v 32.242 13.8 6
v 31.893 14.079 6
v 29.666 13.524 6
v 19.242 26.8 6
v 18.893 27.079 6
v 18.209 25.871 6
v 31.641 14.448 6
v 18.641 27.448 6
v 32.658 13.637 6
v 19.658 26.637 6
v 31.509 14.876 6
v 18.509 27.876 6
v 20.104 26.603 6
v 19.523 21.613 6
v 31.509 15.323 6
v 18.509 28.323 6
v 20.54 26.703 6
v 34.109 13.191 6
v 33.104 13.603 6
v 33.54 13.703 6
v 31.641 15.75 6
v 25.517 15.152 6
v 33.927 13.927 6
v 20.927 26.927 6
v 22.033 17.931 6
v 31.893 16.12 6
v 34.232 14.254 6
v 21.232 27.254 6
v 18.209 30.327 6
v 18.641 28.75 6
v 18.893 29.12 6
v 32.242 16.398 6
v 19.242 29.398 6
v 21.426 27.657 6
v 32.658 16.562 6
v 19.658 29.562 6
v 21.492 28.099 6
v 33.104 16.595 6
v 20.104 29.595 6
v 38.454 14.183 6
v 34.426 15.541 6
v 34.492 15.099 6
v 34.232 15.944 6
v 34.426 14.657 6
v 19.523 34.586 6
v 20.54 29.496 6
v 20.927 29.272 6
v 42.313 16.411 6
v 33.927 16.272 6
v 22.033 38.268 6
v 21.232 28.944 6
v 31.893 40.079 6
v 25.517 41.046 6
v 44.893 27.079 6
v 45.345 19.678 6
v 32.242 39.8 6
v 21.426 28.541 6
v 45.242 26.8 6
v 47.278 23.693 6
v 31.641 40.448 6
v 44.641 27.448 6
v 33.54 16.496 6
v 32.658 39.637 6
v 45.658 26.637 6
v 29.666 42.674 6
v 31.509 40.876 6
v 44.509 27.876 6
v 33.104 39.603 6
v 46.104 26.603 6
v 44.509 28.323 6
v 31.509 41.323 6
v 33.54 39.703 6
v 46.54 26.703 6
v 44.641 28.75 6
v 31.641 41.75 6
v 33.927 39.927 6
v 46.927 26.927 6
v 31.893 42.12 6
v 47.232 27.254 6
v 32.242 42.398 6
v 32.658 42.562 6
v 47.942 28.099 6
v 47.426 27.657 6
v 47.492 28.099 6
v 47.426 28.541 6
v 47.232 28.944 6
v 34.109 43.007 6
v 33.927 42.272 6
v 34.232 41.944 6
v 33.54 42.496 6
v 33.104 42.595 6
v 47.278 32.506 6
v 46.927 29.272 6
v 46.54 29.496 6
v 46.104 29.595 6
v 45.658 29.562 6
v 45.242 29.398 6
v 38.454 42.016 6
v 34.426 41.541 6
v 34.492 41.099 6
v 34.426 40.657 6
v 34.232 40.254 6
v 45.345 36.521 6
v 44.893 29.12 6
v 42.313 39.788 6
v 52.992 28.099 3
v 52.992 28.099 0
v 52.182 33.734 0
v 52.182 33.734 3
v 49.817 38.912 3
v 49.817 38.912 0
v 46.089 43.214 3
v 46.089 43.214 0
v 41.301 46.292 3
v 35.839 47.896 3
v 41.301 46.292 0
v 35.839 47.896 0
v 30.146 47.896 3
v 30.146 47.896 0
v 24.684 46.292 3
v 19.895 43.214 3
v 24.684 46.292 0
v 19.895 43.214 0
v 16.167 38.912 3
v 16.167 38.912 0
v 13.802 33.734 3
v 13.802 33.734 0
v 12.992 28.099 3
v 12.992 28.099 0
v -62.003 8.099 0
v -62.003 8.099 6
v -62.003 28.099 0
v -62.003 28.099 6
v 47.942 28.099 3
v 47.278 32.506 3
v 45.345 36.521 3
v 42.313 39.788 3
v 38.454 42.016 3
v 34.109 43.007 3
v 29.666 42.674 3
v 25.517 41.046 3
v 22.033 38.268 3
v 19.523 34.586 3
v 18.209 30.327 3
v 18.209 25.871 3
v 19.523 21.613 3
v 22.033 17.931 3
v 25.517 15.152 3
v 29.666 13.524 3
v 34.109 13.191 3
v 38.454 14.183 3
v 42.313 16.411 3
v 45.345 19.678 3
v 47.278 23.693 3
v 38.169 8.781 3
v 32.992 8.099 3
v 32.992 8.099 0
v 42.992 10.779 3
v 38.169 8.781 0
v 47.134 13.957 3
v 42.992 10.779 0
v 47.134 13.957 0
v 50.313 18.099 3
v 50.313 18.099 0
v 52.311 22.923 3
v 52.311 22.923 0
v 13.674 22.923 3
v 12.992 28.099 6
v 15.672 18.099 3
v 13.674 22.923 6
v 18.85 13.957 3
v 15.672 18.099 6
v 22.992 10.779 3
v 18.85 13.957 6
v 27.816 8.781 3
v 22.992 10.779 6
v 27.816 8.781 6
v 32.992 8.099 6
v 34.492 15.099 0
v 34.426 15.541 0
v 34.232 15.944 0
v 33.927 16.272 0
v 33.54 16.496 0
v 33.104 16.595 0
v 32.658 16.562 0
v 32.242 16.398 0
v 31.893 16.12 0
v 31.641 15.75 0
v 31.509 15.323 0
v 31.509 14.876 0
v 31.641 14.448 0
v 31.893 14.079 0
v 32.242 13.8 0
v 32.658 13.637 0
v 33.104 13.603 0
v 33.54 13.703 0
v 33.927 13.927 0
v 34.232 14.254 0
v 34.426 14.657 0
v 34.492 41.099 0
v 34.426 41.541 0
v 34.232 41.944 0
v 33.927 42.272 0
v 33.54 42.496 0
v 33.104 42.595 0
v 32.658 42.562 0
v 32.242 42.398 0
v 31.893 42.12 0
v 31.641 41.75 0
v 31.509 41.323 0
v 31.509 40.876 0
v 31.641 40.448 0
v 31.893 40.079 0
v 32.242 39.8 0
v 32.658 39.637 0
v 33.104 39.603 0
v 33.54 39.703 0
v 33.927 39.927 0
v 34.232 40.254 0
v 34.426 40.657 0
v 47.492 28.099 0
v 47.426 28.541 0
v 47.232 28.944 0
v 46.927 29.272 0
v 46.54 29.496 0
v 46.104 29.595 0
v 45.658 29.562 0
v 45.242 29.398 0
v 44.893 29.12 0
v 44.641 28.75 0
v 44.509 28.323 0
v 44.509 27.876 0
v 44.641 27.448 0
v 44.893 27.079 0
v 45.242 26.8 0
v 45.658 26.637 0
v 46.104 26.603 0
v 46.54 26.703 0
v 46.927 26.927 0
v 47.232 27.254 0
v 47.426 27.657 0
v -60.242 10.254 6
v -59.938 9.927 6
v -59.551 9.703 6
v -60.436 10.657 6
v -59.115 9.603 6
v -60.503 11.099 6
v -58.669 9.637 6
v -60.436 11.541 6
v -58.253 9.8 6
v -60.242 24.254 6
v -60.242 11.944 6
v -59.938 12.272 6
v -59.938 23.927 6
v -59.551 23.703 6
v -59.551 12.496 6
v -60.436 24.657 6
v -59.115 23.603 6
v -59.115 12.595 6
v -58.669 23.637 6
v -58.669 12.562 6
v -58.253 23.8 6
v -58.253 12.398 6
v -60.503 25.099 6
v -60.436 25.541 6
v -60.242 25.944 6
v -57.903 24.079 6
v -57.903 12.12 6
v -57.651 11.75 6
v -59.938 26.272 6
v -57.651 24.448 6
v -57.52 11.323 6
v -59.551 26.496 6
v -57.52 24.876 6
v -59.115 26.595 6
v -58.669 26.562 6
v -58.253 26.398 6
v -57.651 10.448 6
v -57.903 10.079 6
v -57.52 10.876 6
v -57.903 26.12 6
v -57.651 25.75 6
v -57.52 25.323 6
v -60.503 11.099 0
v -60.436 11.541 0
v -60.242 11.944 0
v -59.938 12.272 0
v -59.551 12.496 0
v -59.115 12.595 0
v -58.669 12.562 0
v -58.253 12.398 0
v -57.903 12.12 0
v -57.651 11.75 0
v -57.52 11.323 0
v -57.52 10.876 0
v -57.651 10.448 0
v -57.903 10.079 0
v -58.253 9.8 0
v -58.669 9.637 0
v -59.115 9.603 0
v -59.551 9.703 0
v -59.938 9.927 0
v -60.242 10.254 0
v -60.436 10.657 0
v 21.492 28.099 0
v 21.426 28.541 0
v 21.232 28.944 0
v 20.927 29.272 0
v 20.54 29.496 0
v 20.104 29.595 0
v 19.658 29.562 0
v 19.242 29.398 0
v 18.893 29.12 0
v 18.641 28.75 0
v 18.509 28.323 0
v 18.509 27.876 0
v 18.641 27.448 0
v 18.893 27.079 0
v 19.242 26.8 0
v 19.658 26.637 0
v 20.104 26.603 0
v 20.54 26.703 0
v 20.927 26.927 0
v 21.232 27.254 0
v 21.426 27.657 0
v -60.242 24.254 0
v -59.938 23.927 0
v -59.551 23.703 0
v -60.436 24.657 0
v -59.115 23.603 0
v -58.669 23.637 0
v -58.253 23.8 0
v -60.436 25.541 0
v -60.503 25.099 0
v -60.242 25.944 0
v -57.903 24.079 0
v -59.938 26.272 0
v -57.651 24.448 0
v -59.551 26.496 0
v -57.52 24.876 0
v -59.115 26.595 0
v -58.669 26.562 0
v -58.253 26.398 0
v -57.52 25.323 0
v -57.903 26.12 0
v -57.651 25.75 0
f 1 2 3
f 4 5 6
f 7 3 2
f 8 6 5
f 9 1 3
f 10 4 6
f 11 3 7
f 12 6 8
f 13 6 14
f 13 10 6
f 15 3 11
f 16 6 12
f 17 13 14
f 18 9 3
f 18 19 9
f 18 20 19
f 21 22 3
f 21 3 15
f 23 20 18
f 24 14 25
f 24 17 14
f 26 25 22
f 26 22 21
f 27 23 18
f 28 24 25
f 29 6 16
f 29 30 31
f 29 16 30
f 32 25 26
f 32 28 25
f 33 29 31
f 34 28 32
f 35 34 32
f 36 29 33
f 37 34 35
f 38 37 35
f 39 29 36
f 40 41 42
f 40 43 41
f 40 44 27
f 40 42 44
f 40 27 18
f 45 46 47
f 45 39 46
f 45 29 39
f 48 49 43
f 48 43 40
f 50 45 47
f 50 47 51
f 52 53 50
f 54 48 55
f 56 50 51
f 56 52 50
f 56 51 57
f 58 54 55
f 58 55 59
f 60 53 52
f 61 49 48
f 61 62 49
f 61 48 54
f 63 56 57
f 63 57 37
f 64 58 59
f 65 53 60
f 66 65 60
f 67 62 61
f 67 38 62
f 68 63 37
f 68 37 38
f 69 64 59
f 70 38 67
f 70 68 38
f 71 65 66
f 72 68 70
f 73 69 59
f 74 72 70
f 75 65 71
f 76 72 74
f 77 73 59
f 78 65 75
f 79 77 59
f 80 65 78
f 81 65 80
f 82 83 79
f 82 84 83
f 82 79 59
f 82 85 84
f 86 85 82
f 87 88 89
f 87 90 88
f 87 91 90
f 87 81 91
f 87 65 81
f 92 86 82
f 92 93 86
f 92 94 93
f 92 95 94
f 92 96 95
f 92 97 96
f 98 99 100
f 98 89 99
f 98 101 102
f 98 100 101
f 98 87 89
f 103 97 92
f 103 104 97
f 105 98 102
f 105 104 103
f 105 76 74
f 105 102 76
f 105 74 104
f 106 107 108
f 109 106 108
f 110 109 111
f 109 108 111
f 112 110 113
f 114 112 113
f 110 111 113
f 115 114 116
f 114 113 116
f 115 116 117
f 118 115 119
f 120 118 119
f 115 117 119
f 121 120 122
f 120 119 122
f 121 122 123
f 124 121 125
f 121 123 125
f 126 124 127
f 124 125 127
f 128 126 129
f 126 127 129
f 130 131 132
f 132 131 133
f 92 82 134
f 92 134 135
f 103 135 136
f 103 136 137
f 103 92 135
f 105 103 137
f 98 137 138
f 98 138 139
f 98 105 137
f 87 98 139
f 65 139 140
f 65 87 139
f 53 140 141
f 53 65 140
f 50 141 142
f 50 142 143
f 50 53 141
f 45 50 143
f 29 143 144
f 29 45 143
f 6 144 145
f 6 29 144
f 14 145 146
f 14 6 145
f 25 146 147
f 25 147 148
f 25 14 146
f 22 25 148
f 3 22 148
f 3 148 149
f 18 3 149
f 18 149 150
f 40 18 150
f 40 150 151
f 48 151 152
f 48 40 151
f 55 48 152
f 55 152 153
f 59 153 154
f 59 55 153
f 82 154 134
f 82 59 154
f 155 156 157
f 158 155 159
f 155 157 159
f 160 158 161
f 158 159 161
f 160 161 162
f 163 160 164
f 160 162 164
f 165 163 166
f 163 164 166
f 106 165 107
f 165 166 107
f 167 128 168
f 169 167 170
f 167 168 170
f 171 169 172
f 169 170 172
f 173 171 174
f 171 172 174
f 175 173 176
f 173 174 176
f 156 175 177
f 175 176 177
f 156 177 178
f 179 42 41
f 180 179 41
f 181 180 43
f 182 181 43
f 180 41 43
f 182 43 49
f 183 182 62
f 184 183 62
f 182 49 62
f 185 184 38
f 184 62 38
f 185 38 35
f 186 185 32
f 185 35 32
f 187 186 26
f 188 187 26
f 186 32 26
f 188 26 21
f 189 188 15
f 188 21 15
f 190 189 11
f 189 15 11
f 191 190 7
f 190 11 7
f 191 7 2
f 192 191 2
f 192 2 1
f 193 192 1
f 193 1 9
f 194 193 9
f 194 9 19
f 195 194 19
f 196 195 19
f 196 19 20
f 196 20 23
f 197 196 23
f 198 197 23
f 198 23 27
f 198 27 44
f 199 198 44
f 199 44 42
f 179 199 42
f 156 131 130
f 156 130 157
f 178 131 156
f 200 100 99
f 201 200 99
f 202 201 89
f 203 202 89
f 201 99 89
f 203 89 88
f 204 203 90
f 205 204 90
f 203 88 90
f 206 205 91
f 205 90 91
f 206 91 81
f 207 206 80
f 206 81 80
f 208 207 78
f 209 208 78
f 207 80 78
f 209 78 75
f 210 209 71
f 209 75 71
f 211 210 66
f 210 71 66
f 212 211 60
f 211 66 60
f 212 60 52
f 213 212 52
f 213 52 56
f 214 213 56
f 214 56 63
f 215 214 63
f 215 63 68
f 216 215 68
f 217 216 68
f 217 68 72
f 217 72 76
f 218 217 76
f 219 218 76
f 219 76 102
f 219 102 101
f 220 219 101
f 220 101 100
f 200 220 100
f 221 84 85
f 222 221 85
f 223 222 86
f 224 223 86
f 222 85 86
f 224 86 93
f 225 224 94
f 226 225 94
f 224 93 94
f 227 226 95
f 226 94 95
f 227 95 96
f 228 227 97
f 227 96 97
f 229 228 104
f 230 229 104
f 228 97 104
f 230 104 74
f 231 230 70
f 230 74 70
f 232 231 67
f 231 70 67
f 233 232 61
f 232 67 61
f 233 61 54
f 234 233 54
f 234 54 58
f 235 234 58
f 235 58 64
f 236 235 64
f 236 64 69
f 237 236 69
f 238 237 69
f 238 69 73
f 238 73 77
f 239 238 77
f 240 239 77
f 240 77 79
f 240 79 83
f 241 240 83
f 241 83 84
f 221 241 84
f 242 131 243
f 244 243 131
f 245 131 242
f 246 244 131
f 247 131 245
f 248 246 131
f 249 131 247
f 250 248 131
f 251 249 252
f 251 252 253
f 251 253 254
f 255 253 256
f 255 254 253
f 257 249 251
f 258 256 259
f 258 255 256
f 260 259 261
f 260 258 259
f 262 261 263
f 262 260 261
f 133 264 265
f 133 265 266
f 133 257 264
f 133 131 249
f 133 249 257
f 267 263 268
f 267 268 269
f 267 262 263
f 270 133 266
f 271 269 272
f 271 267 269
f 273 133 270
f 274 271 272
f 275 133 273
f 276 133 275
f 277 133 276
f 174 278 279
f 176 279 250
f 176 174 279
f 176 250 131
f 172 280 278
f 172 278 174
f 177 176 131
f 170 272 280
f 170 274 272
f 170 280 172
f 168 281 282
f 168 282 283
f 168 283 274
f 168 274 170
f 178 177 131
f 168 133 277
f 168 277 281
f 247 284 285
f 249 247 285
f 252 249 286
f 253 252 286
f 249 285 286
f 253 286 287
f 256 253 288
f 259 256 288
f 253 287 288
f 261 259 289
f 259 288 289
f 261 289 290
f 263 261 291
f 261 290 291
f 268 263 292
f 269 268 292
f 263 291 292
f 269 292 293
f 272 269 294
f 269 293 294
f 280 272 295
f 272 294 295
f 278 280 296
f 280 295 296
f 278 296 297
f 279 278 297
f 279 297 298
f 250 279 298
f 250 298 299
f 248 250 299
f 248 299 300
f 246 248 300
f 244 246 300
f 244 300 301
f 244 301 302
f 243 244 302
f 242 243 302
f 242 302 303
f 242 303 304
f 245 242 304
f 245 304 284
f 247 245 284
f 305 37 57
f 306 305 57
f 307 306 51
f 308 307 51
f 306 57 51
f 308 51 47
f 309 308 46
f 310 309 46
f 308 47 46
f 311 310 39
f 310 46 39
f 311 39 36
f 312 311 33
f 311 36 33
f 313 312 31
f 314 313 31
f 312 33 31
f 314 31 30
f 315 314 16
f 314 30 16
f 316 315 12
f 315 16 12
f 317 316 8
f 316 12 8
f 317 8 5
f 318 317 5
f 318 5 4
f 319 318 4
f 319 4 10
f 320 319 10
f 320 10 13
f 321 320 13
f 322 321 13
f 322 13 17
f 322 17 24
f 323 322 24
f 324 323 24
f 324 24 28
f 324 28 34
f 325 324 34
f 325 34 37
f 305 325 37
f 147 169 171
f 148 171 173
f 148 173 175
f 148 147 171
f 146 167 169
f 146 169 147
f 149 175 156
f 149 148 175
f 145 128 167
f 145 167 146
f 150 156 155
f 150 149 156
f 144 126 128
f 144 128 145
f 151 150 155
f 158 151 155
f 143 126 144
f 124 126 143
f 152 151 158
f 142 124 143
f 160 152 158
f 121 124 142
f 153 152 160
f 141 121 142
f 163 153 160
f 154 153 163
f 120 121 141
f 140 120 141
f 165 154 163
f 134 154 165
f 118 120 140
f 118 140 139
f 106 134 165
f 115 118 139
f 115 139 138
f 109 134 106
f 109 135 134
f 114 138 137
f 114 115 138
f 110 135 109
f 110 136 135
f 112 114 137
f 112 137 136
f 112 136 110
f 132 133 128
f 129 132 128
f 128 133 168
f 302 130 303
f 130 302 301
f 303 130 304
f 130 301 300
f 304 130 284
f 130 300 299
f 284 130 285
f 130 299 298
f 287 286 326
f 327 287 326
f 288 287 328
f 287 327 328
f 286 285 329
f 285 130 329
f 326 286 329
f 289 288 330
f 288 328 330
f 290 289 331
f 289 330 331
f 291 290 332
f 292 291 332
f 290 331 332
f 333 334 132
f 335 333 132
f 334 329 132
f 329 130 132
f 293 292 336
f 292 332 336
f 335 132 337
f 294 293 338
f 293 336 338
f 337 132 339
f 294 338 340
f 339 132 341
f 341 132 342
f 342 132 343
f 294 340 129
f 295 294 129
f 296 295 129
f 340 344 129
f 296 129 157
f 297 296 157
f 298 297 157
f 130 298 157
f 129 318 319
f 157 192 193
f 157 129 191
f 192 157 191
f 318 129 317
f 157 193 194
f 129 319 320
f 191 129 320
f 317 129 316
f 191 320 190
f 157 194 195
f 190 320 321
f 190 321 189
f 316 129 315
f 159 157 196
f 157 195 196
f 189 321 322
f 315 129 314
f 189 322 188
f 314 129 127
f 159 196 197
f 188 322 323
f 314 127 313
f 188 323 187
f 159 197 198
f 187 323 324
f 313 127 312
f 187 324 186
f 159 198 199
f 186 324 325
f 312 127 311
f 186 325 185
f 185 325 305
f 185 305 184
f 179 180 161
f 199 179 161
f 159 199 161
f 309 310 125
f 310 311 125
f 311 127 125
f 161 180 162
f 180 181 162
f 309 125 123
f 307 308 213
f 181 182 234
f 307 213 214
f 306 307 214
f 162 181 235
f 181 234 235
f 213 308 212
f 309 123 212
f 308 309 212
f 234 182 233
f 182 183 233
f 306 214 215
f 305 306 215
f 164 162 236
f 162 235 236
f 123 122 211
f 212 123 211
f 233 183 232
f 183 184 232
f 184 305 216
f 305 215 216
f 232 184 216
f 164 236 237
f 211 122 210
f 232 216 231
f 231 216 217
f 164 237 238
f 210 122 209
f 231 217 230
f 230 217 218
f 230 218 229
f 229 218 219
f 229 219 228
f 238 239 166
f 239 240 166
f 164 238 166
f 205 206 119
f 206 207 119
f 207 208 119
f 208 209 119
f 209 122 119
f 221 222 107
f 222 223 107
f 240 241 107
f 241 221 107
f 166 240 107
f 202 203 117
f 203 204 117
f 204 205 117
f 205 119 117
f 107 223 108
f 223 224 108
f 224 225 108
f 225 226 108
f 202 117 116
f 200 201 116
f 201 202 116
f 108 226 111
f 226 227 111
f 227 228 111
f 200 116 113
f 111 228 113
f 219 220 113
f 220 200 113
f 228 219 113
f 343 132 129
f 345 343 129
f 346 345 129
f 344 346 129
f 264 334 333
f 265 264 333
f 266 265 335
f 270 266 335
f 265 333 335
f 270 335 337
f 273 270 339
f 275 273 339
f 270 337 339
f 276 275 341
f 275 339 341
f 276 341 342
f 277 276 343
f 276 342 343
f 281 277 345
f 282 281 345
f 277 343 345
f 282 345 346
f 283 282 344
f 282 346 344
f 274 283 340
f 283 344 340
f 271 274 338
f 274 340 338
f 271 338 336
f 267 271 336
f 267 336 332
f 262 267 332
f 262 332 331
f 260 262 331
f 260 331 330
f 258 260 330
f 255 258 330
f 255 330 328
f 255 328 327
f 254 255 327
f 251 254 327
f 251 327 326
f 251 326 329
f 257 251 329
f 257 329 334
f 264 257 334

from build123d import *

# Parameters (mm, degrees)
BOSS_EXTRU_1_DEPTH      = 6
ESQUISSE4_R             = 20
ESQUISSE4_R_2           = 14.95
ENL_V_MAT_EXTRU_2_DEPTH = 3
ESQUISSE5_W             = 16.42
ESQUISSE5_H             = 20
BOSS_EXTRU_2_DEPTH      = 6
ESQUISSE6_R             = 1.5
ENL_V_MAT_EXTRU_3_DEPTH = 10
ESQUISSE9_R             = 1.5
ENL_V_MAT_EXTRU_4_DEPTH = 10


with BuildPart() as part:
    # Esquisse1 → Boss.-Extru.1 (new body)
    with BuildSketch(Plane.XY):
        with BuildLine():
            ThreePointArc((52.992232765, 28.099272116), (32.992232765, 48.099272116), (12.992232765, 28.099272116))
            Line((12.992232765, 28.099272116), (32.992232765, 28.099272116))
            Line((32.992232765, 28.099272116), (32.992232765, 8.099272116))
            ThreePointArc((32.992232765, 8.099272116), (47.134368389, 13.957136493), (52.992232765, 28.099272116))
        make_face()
        with BuildLine():
            Line((32.992232765, 28.099272116), (12.992232765, 28.099272116))
            ThreePointArc((12.992232765, 28.099272116), (18.850097141, 13.957136493), (32.992232765, 8.099272116))
            Line((32.992232765, 8.099272116), (32.992232765, 28.099272116))
        make_face()
        with BuildLine():
            Line((12.992232765, 28.099272116), (-45.58279523, 28.099272116))
            Line((-45.58279523, 28.099272116), (-45.58279523, 8.099272116))
            Line((-45.58279523, 8.099272116), (32.992232765, 8.099272116))
            ThreePointArc((32.992232765, 8.099272116), (18.850097141, 13.957136493), (12.992232765, 28.099272116))
        make_face()
    extrude(amount=BOSS_EXTRU_1_DEPTH)

    # Esquisse4 → Enlèv. mat.-Extru.2 (cut)
    with BuildSketch(Plane.XY.offset(6)):
        with Locations((32.992232765, 28.099272116)):
            Circle(ESQUISSE4_R)
        with Locations((32.992232765, 28.099272116)):
            Circle(ESQUISSE4_R_2, mode=Mode.SUBTRACT)
    extrude(amount=-ENL_V_MAT_EXTRU_2_DEPTH, mode=Mode.SUBTRACT)

    # Esquisse5 → Boss.-Extru.2 (add)
    with BuildSketch(Plane.XY.offset(6)):
        with Locations((-53.79279523, 18.099272116)):
            Rectangle(ESQUISSE5_W, ESQUISSE5_H)
    extrude(amount=-BOSS_EXTRU_2_DEPTH)

    # Esquisse6 → Enlèv. mat.-Extru.3 (cut)
    with BuildSketch(Plane.XY.offset(6)):
        with Locations((32.992232765, 41.099272116)):
            Circle(ESQUISSE6_R)
        with Locations((45.992232765, 28.099272116)):
            Circle(ESQUISSE6_R)
        with Locations((32.992232765, 15.099272116)):
            Circle(ESQUISSE6_R)
        with Locations((19.992232765, 28.099272116)):
            Circle(ESQUISSE6_R)
    extrude(amount=-ENL_V_MAT_EXTRU_3_DEPTH, mode=Mode.SUBTRACT)

    # Esquisse9 → Enlèv. mat.-Extru.4 (cut)
    with BuildSketch(Plane(origin=(0, 0, 0), x_dir=(-1, 0, 0), z_dir=(0, 0, -1))):
        with Locations((59.00279523, 25.099272116)):
            Circle(ESQUISSE9_R)
        with Locations((59.00279523, 11.099272116)):
            Circle(ESQUISSE9_R)
    extrude(amount=-ENL_V_MAT_EXTRU_4_DEPTH, mode=Mode.SUBTRACT)


solid = part.part
